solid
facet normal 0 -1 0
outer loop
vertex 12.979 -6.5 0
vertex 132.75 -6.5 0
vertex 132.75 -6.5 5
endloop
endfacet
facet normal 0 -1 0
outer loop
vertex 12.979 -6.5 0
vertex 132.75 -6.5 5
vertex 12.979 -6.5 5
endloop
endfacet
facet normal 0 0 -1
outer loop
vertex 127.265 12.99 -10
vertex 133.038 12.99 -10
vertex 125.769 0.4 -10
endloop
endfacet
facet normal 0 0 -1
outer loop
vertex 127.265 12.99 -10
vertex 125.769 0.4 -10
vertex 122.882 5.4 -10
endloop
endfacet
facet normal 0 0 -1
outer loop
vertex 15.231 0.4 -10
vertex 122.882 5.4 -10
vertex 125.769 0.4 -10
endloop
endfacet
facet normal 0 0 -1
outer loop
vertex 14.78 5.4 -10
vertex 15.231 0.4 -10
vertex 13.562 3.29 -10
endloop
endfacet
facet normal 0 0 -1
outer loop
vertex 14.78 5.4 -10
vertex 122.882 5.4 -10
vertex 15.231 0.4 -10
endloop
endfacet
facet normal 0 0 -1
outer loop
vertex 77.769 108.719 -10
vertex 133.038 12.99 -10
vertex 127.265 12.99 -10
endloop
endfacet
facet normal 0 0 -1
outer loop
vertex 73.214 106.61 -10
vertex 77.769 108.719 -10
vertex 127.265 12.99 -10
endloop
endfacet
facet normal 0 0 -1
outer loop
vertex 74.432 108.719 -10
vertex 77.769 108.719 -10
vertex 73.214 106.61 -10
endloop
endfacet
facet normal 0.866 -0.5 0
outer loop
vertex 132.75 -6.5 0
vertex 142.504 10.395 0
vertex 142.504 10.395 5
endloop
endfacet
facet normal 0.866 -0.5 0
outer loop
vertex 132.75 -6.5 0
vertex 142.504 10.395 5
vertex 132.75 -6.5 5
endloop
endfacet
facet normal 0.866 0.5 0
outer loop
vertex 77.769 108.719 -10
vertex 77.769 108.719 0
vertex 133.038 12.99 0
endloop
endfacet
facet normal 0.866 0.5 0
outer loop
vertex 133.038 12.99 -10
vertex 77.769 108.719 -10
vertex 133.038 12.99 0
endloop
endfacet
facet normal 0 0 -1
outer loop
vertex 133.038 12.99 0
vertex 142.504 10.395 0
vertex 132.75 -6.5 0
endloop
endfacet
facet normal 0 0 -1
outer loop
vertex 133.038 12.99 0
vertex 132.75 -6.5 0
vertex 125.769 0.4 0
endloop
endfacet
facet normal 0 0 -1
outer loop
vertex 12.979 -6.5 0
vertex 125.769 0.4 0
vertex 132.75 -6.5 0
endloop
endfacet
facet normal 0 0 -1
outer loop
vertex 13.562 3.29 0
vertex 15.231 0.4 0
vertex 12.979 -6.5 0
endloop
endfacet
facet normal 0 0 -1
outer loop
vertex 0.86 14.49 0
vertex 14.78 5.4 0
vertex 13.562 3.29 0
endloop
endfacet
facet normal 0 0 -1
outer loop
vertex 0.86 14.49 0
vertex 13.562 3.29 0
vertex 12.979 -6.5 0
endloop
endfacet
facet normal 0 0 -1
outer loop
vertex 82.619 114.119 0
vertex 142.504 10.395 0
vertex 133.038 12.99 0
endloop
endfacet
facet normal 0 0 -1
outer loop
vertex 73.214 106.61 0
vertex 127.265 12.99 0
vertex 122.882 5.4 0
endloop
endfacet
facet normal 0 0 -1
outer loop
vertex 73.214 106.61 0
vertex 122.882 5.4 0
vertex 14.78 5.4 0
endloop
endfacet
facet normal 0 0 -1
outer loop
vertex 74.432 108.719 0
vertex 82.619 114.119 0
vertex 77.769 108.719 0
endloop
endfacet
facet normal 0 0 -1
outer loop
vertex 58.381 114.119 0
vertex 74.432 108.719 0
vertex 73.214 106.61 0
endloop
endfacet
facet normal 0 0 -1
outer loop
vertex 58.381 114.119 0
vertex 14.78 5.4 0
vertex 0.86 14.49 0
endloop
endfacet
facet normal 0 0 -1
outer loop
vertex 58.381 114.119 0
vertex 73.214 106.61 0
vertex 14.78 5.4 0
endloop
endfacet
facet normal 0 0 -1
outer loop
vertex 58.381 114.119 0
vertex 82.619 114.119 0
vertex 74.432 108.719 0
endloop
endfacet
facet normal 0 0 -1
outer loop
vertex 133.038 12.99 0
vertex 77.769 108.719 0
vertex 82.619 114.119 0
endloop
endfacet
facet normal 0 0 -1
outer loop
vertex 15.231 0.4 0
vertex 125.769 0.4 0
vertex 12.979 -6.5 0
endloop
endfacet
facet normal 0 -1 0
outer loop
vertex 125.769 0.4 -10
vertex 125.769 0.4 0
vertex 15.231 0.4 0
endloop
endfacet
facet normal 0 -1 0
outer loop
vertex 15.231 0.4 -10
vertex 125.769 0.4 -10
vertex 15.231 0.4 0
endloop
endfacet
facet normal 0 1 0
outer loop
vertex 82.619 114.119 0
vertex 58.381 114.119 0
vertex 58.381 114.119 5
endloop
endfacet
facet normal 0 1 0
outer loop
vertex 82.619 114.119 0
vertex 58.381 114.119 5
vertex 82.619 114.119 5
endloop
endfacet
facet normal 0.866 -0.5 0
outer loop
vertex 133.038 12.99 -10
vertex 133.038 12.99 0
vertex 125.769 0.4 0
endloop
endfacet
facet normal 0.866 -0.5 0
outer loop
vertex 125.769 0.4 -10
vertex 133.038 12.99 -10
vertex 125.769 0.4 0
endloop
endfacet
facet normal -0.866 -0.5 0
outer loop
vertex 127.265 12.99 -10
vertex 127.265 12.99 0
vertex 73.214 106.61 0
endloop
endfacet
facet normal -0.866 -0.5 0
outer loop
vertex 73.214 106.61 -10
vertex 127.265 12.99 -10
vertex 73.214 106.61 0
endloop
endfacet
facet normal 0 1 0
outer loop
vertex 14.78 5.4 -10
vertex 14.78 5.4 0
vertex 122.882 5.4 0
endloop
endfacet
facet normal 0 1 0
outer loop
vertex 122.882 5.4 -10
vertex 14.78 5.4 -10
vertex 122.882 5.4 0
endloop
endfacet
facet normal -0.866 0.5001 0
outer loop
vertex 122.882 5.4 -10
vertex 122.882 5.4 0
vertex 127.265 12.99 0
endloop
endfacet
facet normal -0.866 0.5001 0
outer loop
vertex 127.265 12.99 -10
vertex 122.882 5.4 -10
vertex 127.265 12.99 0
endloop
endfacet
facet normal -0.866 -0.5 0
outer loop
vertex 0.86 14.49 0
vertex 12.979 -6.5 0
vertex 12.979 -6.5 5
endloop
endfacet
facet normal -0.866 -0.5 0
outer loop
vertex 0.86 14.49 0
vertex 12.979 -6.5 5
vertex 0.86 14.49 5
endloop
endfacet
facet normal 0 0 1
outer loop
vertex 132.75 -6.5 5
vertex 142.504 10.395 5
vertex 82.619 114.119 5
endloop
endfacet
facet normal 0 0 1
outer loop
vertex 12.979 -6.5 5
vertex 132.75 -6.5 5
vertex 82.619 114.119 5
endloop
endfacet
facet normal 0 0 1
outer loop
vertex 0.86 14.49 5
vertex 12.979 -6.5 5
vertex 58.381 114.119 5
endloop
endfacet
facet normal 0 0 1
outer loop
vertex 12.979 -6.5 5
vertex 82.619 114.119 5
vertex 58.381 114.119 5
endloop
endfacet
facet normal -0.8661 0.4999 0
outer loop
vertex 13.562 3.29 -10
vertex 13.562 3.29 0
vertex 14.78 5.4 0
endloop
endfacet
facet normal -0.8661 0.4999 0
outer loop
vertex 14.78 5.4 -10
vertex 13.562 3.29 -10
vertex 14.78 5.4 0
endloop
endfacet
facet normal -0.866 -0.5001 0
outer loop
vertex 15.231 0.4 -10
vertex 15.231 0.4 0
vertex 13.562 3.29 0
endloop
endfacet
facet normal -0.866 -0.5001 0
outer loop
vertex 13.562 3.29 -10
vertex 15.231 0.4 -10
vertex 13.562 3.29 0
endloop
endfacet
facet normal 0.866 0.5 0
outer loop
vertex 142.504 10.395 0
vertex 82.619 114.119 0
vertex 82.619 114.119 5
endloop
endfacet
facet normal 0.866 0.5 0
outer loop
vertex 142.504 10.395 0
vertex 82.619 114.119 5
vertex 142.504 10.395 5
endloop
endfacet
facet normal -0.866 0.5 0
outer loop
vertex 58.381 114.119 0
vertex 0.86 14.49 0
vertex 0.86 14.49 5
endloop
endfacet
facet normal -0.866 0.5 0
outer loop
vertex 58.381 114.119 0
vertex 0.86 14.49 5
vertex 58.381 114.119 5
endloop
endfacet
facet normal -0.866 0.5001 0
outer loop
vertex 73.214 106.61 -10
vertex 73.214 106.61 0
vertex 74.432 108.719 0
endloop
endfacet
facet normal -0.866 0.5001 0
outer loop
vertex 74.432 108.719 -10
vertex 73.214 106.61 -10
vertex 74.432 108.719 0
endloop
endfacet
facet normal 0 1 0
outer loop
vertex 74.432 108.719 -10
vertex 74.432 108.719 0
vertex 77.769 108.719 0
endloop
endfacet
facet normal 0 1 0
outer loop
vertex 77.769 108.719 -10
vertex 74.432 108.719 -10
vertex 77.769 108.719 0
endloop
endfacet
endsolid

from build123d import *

# Parameters (mm, degrees)
BOSS_EXTRUDE1_DEPTH = 10
BOSS_EXTRUDE2_DEPTH = 5


with BuildPart() as part:
    # Sketch2 → Boss-Extrude1 (new body)
    with BuildSketch(Plane.XY):
        Polygon((77.769059892, 108.719200877), (133.038119785, 12.990381057), (125.769059892, 0.4), (15.230940108, 0.4), (13.562177826, 3.290381057), (14.780166891, 5.4), (122.882308546, 5.4), (127.264617093, 12.990381057), (73.213546265, 106.609581934), (74.43153533, 108.719200877), align=None)
    extrude(amount=-BOSS_EXTRUDE1_DEPTH)

    # Sketch3 → Boss-Extrude2 (add)
    with BuildSketch(Plane.XY):
        Polygon((58.381197846, 114.119200877), (82.618802154, 114.119200877), (142.504165125, 10.394709581), (132.75, -6.5), (12.979274058, -6.5), (0.860471904, 14.490381057), align=None)
    extrude(amount=BOSS_EXTRUDE2_DEPTH)


solid = part.part
